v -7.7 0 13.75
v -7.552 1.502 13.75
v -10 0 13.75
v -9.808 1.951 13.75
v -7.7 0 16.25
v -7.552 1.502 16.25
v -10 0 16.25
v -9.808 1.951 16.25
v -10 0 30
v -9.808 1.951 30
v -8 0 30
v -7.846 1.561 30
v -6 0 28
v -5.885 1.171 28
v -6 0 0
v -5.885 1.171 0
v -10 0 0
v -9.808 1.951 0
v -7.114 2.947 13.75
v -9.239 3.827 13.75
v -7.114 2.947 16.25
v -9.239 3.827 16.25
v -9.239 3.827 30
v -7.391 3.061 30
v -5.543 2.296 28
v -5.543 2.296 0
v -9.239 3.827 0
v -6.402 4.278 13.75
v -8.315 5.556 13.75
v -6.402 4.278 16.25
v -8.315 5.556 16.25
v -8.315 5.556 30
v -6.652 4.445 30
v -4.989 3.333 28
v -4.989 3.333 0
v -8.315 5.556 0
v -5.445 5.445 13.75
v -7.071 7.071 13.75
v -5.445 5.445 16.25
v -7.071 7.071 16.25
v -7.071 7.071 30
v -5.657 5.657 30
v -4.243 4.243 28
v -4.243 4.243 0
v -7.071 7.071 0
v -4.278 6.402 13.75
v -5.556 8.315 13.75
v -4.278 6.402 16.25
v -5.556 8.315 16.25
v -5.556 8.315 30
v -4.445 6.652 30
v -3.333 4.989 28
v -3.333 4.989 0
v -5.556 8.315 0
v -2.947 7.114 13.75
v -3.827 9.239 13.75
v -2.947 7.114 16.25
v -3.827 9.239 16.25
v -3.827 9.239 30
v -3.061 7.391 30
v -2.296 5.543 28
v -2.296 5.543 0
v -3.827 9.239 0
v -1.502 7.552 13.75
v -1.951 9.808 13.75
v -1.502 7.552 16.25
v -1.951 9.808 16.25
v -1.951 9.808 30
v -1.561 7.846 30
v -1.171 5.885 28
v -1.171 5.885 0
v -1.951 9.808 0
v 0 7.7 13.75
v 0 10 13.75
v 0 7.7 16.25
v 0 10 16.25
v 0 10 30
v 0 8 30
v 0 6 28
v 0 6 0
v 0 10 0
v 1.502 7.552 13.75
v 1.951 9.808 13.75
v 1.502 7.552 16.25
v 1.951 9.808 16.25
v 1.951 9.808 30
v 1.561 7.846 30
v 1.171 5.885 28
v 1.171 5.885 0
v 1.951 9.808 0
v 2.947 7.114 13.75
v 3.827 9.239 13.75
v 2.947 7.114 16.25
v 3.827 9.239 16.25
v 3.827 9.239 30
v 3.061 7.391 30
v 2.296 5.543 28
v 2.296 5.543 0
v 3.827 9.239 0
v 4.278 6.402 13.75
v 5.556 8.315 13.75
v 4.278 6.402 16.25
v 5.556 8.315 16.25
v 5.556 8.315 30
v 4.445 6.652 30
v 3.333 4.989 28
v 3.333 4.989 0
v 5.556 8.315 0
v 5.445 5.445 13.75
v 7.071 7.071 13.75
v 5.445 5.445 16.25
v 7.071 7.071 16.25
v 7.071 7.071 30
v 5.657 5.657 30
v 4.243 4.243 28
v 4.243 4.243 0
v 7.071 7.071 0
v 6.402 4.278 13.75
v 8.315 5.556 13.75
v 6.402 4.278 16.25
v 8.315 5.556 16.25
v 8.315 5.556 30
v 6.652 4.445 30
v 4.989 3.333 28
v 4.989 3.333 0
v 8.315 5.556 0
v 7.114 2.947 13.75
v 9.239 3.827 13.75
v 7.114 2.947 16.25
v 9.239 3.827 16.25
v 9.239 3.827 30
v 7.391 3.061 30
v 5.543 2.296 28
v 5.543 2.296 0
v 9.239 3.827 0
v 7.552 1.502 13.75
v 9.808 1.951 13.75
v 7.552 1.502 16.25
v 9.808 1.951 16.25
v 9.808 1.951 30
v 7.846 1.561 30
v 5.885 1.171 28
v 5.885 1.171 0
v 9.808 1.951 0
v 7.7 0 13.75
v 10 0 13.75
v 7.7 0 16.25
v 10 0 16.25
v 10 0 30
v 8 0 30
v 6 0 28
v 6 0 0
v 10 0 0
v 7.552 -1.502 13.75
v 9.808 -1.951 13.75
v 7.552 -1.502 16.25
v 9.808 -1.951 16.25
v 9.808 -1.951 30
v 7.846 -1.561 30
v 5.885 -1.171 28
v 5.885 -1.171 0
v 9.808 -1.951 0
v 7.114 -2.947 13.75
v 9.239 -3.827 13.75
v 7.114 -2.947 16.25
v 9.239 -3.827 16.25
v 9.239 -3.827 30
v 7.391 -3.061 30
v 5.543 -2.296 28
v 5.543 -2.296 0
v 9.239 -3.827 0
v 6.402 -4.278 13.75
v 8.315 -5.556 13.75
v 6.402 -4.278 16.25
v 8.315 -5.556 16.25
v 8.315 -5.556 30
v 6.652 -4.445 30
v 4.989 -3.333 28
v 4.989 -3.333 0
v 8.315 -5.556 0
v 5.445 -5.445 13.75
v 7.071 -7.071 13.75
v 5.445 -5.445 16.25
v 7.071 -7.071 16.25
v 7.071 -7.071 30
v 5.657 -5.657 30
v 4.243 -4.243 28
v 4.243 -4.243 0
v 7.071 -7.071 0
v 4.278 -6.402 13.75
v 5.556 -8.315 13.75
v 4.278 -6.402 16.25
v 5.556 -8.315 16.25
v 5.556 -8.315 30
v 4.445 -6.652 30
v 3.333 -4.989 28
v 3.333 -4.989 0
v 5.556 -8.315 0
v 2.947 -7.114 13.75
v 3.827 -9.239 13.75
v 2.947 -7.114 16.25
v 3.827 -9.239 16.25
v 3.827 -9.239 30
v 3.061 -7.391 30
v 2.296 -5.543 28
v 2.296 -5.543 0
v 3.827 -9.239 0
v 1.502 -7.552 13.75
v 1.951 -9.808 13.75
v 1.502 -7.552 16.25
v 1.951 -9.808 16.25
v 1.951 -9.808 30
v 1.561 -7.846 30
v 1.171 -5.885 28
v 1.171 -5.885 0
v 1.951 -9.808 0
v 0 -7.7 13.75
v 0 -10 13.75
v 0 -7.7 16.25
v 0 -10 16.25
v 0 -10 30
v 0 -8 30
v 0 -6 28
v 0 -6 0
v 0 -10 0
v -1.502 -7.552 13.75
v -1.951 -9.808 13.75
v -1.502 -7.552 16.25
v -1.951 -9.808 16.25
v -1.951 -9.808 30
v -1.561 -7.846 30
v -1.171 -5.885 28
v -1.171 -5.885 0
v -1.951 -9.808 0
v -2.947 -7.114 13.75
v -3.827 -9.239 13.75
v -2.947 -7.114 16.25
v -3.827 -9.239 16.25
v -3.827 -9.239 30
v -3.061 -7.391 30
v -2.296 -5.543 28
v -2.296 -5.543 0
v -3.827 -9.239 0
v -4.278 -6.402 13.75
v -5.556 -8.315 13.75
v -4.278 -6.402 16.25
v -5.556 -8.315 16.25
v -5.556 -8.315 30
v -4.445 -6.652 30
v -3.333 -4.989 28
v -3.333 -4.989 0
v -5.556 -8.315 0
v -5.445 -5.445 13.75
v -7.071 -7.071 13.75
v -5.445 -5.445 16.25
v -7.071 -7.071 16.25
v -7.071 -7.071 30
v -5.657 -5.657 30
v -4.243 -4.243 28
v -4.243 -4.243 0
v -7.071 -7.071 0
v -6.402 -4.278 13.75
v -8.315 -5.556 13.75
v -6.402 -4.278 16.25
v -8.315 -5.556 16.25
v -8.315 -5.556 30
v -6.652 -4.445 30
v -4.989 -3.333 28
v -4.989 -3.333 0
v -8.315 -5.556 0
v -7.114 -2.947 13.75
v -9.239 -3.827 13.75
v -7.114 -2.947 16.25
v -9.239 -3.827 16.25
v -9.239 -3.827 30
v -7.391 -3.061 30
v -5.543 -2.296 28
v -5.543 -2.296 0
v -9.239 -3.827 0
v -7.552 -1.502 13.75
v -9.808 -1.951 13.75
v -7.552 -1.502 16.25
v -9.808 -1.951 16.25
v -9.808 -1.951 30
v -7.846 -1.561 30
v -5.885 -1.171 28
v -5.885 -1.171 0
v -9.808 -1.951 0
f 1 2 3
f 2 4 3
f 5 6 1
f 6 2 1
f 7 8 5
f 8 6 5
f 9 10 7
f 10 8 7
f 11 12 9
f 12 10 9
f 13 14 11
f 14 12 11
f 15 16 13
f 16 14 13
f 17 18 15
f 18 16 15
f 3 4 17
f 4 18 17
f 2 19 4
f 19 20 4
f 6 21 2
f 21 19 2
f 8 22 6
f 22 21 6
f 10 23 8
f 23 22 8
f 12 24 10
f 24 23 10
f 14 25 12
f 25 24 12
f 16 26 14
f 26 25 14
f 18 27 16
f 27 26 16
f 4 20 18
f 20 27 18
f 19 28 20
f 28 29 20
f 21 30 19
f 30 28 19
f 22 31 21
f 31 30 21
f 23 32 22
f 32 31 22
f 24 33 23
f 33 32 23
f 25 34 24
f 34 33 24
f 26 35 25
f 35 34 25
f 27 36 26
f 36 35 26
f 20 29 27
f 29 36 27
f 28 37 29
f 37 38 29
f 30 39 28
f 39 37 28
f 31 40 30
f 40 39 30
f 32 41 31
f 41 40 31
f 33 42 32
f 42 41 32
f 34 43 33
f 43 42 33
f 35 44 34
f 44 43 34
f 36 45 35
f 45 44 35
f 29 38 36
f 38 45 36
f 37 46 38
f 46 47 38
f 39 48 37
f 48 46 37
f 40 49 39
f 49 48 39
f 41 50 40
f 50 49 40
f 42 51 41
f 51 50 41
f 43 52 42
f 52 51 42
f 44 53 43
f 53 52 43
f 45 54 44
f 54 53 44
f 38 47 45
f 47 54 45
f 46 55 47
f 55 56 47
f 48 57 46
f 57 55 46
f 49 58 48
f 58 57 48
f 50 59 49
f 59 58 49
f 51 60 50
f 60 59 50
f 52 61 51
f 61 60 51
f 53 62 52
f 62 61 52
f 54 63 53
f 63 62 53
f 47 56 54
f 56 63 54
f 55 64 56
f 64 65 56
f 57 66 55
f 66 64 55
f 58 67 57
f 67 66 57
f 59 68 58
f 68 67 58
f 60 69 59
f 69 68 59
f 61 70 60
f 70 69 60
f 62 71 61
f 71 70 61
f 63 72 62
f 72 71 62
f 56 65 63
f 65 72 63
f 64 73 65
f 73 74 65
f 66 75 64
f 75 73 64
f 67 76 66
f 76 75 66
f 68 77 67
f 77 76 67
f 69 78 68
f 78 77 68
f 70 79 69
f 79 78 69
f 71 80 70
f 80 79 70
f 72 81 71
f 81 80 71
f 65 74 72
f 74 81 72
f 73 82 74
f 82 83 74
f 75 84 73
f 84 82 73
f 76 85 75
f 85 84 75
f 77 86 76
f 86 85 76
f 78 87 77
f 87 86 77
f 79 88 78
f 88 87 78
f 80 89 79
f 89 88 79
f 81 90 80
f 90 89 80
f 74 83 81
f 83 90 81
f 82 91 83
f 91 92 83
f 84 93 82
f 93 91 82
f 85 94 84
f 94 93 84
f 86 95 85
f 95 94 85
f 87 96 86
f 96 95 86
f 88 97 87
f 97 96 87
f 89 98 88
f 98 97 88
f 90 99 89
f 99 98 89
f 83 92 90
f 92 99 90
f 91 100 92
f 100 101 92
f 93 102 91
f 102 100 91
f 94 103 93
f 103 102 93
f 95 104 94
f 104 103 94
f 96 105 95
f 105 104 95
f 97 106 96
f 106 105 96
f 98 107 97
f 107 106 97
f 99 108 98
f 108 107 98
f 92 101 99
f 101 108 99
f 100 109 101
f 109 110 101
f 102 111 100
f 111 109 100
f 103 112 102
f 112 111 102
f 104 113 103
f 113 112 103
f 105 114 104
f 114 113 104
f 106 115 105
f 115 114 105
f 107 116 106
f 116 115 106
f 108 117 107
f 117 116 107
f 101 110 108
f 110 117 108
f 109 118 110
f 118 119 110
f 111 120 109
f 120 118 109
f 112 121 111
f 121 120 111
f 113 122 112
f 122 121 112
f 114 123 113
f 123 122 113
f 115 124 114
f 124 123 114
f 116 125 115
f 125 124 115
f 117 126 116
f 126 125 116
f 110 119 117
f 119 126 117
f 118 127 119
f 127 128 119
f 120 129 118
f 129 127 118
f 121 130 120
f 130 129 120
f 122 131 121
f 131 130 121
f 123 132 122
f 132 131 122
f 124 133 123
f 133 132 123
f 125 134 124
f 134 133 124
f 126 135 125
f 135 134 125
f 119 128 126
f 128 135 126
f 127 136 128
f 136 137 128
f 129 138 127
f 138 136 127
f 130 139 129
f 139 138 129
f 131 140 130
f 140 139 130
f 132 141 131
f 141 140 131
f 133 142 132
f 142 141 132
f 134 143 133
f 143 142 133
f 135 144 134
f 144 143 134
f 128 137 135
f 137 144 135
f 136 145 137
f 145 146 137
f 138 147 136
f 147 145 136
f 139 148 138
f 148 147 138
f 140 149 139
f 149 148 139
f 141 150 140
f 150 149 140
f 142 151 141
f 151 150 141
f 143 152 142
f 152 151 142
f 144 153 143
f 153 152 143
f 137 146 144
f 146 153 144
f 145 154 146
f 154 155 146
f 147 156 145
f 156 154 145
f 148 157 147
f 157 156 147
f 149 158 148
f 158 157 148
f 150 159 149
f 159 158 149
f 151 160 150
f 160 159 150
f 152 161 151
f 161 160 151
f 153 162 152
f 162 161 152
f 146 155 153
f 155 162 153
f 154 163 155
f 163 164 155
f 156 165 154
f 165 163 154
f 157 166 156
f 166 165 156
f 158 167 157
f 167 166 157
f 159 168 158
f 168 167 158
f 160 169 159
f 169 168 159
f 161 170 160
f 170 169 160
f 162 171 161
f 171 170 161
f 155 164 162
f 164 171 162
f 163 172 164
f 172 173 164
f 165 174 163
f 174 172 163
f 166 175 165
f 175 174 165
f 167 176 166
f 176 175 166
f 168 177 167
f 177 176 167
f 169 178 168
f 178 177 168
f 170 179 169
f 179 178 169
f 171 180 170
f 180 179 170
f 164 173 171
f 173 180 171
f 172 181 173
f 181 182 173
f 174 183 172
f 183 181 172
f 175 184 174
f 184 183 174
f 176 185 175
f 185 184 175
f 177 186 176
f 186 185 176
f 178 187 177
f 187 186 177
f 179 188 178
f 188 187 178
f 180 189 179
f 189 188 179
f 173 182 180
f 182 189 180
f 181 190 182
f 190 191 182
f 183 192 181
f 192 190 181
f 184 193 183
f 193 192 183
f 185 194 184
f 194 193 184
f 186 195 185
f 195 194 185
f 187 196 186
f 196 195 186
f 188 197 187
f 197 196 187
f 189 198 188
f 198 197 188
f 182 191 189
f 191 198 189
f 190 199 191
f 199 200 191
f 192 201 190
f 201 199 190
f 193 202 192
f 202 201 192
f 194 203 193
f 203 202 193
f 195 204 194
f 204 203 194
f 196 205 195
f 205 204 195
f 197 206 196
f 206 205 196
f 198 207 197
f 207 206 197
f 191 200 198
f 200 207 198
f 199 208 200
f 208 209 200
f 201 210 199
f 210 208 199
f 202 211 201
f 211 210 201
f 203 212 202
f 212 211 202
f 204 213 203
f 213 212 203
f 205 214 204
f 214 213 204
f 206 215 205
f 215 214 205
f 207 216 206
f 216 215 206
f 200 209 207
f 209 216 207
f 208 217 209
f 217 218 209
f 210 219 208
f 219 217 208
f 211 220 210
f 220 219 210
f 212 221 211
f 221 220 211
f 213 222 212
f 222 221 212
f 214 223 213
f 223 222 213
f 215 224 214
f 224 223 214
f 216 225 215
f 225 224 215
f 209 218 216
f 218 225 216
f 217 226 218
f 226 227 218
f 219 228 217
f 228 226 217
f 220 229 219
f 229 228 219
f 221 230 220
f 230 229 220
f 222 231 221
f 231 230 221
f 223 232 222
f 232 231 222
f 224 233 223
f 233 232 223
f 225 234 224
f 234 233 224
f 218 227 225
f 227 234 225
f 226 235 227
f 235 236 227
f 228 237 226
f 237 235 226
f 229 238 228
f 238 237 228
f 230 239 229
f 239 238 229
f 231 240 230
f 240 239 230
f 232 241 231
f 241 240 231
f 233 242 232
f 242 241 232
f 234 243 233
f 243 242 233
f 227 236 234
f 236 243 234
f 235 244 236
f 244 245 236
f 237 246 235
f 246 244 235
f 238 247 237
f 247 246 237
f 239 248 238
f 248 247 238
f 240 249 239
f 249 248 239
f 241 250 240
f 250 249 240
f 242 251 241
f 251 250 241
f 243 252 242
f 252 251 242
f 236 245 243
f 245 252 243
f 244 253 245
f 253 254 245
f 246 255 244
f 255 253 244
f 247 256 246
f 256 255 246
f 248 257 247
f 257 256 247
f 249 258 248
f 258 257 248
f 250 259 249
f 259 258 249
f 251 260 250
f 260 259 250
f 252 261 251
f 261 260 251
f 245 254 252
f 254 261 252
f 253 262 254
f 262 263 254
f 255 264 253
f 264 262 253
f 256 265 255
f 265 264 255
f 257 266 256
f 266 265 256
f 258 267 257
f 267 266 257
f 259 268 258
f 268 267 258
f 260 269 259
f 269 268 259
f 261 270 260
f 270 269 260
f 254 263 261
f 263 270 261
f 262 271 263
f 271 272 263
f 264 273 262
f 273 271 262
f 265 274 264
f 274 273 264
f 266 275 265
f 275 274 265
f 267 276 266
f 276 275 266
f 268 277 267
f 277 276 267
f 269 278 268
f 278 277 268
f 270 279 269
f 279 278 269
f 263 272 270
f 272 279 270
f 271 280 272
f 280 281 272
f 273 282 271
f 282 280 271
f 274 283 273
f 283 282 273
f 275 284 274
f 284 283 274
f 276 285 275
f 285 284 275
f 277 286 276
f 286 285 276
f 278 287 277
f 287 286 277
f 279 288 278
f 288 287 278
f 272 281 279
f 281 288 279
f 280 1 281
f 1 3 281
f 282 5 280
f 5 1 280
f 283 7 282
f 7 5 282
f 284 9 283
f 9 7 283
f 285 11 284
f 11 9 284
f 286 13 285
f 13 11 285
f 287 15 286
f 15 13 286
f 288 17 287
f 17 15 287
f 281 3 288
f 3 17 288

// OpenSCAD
$fn = 32;

// ----------------------------------------------------------------------
// Grooved revolve: thread_relief, bore R6
// ----------------------------------------------------------------------

// --- parameters (mm) ---
bore_r = 6;               // bore radius
outer_r = 10;             // outer radius of the body
total_h = 30;             // overall height, Z
wall = 4;                 // radial wall thickness
groove_w = 2.5;           // groove width
groove_d = 2.3;           // groove depth
grooves = 1;              // number of outer grooves
relief = 2;               // thread relief leg at the bore mouth
relief_angle = 45;        // thread relief chamfer angle, degrees

bbox_x = 2 * outer_r;  // full diameter
bore_d = 2 * bore_r;  // bore diameter
body_d = 2 * outer_r;  // body diameter
revolve_angle = 360;  // full turn around the Z axis

profile = [[6, 0], [10, 0], [10, 13.75], [7.7, 13.75], [7.7, 16.25], [10, 16.25], [10, 30], [8, 30], [6, 28]];  // primary outline, 9 points, counter clockwise

// --- the one profile operation ---
rotate_extrude(angle = revolve_angle) polygon(points = profile);
